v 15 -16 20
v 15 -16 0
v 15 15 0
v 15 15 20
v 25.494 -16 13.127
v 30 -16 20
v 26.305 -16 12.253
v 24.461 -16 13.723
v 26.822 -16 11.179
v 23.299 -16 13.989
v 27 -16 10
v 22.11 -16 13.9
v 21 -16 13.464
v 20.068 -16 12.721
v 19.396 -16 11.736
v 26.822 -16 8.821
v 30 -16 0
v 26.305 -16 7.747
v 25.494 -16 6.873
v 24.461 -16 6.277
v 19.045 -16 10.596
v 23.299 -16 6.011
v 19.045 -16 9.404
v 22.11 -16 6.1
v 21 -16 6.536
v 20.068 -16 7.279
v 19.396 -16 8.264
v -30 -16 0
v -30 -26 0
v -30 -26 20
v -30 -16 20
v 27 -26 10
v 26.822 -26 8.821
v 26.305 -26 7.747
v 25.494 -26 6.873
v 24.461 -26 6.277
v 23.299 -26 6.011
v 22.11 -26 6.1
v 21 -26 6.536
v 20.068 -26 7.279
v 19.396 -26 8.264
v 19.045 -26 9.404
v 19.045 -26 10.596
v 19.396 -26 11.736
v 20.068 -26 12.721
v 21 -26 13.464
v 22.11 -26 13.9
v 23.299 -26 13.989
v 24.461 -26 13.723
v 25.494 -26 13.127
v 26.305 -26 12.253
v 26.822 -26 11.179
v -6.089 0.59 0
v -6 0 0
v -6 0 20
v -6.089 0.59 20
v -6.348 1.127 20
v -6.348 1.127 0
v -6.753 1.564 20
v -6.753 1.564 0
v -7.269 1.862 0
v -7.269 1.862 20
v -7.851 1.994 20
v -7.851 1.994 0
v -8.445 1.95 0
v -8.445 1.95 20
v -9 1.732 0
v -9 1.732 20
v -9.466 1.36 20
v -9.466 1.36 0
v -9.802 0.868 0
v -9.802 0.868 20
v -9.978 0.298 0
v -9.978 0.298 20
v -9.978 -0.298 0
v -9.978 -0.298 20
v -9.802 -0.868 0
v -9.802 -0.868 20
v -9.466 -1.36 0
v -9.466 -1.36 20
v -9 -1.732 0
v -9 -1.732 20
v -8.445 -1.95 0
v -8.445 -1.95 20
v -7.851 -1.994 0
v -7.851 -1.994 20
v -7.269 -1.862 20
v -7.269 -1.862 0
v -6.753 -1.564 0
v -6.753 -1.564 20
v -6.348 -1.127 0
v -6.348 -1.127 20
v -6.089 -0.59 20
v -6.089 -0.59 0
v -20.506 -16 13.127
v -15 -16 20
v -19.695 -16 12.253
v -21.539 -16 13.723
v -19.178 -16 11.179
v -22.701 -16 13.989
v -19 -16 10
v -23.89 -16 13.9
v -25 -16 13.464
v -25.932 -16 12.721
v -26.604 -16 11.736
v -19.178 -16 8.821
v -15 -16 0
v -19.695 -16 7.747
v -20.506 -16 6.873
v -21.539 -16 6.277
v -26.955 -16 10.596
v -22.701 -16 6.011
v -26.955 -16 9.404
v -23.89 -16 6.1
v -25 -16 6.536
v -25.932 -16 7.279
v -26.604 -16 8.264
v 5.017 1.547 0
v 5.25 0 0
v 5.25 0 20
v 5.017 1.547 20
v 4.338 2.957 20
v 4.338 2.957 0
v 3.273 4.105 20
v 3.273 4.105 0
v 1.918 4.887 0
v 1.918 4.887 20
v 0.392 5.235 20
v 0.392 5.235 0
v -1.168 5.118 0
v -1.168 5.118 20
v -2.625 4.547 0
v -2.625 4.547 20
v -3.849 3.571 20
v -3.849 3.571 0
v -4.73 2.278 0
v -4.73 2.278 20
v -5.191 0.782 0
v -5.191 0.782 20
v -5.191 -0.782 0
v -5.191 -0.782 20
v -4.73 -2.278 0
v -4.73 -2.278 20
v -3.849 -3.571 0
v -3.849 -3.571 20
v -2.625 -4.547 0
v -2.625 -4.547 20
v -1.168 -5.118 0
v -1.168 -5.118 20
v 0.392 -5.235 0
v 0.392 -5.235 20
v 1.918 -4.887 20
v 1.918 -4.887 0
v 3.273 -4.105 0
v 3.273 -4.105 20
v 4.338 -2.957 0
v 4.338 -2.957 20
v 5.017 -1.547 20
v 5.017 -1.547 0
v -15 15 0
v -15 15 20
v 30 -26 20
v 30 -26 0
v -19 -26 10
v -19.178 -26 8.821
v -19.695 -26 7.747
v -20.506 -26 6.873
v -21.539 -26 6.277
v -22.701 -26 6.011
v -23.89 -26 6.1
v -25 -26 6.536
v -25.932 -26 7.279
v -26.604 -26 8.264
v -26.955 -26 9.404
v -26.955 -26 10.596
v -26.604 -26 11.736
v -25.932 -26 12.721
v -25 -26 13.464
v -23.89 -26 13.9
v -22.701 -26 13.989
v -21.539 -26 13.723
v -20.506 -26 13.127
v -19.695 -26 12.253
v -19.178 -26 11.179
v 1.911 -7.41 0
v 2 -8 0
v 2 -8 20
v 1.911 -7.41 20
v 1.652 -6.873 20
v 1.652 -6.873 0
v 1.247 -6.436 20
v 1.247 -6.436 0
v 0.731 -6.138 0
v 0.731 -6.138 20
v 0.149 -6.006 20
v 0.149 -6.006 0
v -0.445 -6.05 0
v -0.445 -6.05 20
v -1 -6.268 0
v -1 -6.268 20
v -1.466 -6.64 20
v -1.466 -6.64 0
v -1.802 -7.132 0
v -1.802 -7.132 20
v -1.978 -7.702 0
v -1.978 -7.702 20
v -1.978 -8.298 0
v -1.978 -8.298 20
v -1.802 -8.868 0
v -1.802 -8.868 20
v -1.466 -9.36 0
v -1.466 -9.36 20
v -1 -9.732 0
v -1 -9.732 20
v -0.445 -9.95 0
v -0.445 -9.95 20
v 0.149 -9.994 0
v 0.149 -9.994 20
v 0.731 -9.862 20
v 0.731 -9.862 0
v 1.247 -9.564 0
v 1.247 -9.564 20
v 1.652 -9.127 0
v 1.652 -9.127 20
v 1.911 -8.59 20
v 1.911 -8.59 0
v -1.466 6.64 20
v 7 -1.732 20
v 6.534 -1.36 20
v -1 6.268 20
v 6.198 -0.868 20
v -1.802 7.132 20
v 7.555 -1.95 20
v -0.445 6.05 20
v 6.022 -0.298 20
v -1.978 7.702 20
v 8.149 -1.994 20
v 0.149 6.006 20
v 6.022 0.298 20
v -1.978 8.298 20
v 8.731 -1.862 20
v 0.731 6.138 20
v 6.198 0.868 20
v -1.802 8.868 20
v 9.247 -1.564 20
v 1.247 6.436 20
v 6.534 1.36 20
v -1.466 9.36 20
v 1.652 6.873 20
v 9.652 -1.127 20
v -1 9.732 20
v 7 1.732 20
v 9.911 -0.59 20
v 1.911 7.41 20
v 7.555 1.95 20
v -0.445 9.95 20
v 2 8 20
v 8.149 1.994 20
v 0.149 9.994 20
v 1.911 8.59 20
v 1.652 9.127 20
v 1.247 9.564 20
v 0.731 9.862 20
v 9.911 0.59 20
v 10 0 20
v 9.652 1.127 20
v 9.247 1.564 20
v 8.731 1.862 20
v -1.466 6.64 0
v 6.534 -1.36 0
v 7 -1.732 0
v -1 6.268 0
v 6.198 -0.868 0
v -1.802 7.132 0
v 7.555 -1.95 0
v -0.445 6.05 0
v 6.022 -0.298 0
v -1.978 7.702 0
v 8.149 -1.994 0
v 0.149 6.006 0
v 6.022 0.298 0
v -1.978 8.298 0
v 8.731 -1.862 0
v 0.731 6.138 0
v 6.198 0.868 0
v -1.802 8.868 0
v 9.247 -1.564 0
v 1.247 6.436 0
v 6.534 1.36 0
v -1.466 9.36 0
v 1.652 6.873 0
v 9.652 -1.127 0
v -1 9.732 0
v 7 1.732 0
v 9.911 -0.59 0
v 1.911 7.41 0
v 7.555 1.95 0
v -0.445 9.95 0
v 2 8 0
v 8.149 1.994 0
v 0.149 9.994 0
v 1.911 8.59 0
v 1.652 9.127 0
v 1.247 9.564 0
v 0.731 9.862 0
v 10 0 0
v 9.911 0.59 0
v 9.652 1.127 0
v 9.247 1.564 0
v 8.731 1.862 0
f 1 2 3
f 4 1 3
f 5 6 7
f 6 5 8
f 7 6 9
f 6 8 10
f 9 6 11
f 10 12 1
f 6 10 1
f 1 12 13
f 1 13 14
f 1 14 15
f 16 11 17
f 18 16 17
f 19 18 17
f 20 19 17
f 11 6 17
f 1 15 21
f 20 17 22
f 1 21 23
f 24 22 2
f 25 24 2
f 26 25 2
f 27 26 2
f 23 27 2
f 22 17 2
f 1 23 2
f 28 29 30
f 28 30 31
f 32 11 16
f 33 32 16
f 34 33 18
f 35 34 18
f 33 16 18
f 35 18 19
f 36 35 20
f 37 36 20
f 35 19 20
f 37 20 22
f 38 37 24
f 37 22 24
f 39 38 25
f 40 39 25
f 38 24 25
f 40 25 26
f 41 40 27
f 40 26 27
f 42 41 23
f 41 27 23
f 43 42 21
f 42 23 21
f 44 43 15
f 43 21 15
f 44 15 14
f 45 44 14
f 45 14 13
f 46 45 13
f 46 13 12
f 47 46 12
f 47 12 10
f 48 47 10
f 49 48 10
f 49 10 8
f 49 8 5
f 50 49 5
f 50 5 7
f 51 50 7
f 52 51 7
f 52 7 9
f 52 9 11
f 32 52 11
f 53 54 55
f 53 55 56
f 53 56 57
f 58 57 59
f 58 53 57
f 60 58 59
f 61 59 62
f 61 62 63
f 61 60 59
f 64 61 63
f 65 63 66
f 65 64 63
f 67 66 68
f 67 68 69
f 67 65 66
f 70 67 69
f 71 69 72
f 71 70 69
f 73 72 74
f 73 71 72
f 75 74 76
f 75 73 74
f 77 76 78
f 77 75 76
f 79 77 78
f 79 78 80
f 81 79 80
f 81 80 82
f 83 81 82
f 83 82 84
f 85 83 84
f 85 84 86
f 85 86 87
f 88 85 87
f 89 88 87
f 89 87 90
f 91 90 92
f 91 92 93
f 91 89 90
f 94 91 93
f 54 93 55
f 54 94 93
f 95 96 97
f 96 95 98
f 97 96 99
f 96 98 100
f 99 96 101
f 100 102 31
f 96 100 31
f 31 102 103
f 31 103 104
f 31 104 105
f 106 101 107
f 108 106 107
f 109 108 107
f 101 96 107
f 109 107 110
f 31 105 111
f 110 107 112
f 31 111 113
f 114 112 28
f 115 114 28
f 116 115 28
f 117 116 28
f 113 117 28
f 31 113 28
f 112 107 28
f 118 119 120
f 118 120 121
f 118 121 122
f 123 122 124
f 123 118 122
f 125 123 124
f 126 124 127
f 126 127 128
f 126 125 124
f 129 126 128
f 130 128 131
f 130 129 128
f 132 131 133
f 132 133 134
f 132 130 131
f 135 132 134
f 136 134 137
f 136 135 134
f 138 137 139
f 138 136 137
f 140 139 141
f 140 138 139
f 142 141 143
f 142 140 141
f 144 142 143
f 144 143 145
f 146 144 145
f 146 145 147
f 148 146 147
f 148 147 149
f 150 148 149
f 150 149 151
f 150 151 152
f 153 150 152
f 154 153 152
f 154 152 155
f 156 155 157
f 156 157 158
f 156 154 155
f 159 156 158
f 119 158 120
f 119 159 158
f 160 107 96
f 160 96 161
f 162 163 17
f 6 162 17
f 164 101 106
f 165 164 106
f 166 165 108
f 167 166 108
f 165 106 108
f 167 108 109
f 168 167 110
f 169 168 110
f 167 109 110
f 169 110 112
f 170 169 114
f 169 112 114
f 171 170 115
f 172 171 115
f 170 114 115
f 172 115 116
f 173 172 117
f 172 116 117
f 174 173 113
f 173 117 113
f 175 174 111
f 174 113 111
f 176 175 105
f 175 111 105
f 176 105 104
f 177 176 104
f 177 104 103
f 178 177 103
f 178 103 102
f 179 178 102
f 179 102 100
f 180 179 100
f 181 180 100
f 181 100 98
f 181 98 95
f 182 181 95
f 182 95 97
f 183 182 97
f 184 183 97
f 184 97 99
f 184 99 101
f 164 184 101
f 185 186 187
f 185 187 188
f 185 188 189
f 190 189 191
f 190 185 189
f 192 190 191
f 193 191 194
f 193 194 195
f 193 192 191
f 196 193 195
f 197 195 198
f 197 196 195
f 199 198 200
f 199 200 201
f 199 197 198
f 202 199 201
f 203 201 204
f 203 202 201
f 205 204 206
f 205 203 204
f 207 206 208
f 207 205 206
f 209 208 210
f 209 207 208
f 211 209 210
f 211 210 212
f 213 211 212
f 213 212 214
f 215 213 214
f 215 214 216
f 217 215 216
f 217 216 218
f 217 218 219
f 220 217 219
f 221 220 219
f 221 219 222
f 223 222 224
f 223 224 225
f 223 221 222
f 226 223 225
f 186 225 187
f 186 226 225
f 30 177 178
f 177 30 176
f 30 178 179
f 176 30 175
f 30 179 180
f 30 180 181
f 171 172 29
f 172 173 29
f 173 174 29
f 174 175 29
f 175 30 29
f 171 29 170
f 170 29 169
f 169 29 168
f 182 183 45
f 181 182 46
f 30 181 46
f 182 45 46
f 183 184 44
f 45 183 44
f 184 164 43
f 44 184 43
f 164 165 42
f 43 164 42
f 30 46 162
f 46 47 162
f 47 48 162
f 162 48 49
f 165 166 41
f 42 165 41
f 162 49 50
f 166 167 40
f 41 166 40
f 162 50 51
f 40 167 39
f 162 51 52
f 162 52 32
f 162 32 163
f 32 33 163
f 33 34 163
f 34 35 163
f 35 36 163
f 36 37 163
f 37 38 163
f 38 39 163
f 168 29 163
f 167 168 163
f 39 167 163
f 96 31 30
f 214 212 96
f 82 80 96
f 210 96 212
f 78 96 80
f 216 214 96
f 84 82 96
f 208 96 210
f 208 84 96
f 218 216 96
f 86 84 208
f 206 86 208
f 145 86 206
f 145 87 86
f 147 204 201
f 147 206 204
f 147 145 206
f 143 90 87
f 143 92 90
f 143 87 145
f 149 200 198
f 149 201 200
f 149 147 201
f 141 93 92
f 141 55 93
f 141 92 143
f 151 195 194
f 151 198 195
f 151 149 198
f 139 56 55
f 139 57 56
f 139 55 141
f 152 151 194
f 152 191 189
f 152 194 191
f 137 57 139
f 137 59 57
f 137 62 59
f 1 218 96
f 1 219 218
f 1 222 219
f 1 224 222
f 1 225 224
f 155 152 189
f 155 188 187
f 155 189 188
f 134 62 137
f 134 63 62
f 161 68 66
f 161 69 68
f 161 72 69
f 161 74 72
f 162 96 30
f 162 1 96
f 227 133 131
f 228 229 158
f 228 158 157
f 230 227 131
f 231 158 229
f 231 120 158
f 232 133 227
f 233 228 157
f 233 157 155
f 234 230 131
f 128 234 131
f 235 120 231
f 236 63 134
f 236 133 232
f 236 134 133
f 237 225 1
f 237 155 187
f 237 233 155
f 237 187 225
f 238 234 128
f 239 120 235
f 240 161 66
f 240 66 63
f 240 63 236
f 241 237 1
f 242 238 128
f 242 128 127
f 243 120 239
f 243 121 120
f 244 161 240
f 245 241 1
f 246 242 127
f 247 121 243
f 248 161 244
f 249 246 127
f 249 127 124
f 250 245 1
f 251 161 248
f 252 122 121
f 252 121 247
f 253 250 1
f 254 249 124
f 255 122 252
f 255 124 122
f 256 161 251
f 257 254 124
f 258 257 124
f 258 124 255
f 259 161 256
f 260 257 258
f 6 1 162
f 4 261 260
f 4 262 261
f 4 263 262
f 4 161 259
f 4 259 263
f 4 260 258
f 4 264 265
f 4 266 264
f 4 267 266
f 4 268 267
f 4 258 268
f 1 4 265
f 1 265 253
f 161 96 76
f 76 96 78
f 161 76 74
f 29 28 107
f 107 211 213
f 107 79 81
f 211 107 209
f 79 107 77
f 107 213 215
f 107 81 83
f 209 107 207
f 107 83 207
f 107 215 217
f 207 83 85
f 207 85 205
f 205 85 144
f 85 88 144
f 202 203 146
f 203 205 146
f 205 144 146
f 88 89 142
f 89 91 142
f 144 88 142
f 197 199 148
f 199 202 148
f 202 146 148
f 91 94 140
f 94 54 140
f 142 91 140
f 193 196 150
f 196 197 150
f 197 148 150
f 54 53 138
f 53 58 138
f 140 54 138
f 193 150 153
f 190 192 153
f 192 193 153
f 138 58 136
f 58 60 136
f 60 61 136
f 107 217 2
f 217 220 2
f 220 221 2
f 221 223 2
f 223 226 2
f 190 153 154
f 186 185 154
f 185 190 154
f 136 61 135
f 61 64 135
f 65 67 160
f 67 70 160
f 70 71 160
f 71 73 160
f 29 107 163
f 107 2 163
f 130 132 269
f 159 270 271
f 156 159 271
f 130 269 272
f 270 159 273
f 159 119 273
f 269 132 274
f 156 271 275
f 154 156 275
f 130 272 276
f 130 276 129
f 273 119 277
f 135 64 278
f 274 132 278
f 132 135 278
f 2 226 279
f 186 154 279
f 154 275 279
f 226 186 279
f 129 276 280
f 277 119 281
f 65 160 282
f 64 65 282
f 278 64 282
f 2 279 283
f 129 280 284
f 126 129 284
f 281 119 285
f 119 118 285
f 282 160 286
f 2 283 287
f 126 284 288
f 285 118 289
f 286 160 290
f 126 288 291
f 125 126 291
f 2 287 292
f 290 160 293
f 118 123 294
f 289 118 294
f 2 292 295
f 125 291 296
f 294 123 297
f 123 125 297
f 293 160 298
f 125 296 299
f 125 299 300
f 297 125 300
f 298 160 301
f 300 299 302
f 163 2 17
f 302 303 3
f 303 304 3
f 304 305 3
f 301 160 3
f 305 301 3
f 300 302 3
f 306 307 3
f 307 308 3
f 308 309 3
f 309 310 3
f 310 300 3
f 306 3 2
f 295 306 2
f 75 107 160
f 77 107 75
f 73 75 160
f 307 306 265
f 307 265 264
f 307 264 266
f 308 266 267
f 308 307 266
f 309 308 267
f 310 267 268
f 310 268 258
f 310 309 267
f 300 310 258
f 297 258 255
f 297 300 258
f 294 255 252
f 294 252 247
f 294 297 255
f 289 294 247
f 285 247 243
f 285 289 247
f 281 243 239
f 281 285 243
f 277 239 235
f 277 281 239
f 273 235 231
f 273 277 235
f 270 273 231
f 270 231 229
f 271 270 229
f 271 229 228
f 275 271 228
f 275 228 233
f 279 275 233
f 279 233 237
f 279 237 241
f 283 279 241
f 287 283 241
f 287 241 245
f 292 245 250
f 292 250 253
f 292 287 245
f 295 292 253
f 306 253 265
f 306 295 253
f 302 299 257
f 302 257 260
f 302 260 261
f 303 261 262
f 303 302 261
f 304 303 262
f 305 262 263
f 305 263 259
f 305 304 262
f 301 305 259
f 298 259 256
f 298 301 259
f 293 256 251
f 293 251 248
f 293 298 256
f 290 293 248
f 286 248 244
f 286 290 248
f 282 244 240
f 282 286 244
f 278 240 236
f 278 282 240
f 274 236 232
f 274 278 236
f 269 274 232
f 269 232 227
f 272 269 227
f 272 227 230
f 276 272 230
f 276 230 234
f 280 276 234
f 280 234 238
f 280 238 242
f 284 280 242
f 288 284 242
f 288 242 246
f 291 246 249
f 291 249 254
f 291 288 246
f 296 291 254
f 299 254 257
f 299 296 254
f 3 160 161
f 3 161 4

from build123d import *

# Parameters (mm, degrees)
SKETCH1_W           = 60
SKETCH1_H           = 41
SKETCH1_R           = 5.25
SKETCH1_R_2         = 2
BOSS_EXTRUDE1_DEPTH = 20
SKETCH2_R           = 4
CUT_EXTRUDE1_DEPTH  = 42
SKETCH3_W           = 15
SKETCH3_H           = 31
CUT_EXTRUDE2_DEPTH  = 21


with BuildPart() as part:
    # Sketch1 → Boss-Extrude1 (new body)
    with BuildSketch(Plane.XY):
        with Locations((0, -5.5)):
            Rectangle(SKETCH1_W, SKETCH1_H)
        Circle(SKETCH1_R, mode=Mode.SUBTRACT)
        with Locations((0, 8)):
            Circle(SKETCH1_R_2, mode=Mode.SUBTRACT)
        with Locations((8, 0)):
            Circle(SKETCH1_R_2, mode=Mode.SUBTRACT)
        with Locations((0, -8)):
            Circle(SKETCH1_R_2, mode=Mode.SUBTRACT)
        with Locations((-8, 0)):
            Circle(SKETCH1_R_2, mode=Mode.SUBTRACT)
    extrude(amount=BOSS_EXTRUDE1_DEPTH)

    # Sketch2 → Cut-Extrude1 (cut, through all)
    with BuildSketch(Plane(origin=(0, 15, 0), x_dir=(1, 0, 0), z_dir=(0, 1, 0))):
        with Locations((-23, -10)):
            Circle(SKETCH2_R)
        with Locations((23, -10)):
            Circle(SKETCH2_R)
    extrude(amount=-CUT_EXTRUDE1_DEPTH, mode=Mode.SUBTRACT)

    # Sketch3 → Cut-Extrude2 (cut, through all)
    with BuildSketch(Plane(origin=(0, 0, 0), x_dir=(-1, 0, 0), z_dir=(0, 0, -1))):
        with Locations((22.5, -0.5)):
            Rectangle(SKETCH3_W, SKETCH3_H)
        with Locations((-22.5, -0.5)):
            Rectangle(SKETCH3_W, SKETCH3_H)
    extrude(amount=-CUT_EXTRUDE2_DEPTH, mode=Mode.SUBTRACT)


solid = part.part
